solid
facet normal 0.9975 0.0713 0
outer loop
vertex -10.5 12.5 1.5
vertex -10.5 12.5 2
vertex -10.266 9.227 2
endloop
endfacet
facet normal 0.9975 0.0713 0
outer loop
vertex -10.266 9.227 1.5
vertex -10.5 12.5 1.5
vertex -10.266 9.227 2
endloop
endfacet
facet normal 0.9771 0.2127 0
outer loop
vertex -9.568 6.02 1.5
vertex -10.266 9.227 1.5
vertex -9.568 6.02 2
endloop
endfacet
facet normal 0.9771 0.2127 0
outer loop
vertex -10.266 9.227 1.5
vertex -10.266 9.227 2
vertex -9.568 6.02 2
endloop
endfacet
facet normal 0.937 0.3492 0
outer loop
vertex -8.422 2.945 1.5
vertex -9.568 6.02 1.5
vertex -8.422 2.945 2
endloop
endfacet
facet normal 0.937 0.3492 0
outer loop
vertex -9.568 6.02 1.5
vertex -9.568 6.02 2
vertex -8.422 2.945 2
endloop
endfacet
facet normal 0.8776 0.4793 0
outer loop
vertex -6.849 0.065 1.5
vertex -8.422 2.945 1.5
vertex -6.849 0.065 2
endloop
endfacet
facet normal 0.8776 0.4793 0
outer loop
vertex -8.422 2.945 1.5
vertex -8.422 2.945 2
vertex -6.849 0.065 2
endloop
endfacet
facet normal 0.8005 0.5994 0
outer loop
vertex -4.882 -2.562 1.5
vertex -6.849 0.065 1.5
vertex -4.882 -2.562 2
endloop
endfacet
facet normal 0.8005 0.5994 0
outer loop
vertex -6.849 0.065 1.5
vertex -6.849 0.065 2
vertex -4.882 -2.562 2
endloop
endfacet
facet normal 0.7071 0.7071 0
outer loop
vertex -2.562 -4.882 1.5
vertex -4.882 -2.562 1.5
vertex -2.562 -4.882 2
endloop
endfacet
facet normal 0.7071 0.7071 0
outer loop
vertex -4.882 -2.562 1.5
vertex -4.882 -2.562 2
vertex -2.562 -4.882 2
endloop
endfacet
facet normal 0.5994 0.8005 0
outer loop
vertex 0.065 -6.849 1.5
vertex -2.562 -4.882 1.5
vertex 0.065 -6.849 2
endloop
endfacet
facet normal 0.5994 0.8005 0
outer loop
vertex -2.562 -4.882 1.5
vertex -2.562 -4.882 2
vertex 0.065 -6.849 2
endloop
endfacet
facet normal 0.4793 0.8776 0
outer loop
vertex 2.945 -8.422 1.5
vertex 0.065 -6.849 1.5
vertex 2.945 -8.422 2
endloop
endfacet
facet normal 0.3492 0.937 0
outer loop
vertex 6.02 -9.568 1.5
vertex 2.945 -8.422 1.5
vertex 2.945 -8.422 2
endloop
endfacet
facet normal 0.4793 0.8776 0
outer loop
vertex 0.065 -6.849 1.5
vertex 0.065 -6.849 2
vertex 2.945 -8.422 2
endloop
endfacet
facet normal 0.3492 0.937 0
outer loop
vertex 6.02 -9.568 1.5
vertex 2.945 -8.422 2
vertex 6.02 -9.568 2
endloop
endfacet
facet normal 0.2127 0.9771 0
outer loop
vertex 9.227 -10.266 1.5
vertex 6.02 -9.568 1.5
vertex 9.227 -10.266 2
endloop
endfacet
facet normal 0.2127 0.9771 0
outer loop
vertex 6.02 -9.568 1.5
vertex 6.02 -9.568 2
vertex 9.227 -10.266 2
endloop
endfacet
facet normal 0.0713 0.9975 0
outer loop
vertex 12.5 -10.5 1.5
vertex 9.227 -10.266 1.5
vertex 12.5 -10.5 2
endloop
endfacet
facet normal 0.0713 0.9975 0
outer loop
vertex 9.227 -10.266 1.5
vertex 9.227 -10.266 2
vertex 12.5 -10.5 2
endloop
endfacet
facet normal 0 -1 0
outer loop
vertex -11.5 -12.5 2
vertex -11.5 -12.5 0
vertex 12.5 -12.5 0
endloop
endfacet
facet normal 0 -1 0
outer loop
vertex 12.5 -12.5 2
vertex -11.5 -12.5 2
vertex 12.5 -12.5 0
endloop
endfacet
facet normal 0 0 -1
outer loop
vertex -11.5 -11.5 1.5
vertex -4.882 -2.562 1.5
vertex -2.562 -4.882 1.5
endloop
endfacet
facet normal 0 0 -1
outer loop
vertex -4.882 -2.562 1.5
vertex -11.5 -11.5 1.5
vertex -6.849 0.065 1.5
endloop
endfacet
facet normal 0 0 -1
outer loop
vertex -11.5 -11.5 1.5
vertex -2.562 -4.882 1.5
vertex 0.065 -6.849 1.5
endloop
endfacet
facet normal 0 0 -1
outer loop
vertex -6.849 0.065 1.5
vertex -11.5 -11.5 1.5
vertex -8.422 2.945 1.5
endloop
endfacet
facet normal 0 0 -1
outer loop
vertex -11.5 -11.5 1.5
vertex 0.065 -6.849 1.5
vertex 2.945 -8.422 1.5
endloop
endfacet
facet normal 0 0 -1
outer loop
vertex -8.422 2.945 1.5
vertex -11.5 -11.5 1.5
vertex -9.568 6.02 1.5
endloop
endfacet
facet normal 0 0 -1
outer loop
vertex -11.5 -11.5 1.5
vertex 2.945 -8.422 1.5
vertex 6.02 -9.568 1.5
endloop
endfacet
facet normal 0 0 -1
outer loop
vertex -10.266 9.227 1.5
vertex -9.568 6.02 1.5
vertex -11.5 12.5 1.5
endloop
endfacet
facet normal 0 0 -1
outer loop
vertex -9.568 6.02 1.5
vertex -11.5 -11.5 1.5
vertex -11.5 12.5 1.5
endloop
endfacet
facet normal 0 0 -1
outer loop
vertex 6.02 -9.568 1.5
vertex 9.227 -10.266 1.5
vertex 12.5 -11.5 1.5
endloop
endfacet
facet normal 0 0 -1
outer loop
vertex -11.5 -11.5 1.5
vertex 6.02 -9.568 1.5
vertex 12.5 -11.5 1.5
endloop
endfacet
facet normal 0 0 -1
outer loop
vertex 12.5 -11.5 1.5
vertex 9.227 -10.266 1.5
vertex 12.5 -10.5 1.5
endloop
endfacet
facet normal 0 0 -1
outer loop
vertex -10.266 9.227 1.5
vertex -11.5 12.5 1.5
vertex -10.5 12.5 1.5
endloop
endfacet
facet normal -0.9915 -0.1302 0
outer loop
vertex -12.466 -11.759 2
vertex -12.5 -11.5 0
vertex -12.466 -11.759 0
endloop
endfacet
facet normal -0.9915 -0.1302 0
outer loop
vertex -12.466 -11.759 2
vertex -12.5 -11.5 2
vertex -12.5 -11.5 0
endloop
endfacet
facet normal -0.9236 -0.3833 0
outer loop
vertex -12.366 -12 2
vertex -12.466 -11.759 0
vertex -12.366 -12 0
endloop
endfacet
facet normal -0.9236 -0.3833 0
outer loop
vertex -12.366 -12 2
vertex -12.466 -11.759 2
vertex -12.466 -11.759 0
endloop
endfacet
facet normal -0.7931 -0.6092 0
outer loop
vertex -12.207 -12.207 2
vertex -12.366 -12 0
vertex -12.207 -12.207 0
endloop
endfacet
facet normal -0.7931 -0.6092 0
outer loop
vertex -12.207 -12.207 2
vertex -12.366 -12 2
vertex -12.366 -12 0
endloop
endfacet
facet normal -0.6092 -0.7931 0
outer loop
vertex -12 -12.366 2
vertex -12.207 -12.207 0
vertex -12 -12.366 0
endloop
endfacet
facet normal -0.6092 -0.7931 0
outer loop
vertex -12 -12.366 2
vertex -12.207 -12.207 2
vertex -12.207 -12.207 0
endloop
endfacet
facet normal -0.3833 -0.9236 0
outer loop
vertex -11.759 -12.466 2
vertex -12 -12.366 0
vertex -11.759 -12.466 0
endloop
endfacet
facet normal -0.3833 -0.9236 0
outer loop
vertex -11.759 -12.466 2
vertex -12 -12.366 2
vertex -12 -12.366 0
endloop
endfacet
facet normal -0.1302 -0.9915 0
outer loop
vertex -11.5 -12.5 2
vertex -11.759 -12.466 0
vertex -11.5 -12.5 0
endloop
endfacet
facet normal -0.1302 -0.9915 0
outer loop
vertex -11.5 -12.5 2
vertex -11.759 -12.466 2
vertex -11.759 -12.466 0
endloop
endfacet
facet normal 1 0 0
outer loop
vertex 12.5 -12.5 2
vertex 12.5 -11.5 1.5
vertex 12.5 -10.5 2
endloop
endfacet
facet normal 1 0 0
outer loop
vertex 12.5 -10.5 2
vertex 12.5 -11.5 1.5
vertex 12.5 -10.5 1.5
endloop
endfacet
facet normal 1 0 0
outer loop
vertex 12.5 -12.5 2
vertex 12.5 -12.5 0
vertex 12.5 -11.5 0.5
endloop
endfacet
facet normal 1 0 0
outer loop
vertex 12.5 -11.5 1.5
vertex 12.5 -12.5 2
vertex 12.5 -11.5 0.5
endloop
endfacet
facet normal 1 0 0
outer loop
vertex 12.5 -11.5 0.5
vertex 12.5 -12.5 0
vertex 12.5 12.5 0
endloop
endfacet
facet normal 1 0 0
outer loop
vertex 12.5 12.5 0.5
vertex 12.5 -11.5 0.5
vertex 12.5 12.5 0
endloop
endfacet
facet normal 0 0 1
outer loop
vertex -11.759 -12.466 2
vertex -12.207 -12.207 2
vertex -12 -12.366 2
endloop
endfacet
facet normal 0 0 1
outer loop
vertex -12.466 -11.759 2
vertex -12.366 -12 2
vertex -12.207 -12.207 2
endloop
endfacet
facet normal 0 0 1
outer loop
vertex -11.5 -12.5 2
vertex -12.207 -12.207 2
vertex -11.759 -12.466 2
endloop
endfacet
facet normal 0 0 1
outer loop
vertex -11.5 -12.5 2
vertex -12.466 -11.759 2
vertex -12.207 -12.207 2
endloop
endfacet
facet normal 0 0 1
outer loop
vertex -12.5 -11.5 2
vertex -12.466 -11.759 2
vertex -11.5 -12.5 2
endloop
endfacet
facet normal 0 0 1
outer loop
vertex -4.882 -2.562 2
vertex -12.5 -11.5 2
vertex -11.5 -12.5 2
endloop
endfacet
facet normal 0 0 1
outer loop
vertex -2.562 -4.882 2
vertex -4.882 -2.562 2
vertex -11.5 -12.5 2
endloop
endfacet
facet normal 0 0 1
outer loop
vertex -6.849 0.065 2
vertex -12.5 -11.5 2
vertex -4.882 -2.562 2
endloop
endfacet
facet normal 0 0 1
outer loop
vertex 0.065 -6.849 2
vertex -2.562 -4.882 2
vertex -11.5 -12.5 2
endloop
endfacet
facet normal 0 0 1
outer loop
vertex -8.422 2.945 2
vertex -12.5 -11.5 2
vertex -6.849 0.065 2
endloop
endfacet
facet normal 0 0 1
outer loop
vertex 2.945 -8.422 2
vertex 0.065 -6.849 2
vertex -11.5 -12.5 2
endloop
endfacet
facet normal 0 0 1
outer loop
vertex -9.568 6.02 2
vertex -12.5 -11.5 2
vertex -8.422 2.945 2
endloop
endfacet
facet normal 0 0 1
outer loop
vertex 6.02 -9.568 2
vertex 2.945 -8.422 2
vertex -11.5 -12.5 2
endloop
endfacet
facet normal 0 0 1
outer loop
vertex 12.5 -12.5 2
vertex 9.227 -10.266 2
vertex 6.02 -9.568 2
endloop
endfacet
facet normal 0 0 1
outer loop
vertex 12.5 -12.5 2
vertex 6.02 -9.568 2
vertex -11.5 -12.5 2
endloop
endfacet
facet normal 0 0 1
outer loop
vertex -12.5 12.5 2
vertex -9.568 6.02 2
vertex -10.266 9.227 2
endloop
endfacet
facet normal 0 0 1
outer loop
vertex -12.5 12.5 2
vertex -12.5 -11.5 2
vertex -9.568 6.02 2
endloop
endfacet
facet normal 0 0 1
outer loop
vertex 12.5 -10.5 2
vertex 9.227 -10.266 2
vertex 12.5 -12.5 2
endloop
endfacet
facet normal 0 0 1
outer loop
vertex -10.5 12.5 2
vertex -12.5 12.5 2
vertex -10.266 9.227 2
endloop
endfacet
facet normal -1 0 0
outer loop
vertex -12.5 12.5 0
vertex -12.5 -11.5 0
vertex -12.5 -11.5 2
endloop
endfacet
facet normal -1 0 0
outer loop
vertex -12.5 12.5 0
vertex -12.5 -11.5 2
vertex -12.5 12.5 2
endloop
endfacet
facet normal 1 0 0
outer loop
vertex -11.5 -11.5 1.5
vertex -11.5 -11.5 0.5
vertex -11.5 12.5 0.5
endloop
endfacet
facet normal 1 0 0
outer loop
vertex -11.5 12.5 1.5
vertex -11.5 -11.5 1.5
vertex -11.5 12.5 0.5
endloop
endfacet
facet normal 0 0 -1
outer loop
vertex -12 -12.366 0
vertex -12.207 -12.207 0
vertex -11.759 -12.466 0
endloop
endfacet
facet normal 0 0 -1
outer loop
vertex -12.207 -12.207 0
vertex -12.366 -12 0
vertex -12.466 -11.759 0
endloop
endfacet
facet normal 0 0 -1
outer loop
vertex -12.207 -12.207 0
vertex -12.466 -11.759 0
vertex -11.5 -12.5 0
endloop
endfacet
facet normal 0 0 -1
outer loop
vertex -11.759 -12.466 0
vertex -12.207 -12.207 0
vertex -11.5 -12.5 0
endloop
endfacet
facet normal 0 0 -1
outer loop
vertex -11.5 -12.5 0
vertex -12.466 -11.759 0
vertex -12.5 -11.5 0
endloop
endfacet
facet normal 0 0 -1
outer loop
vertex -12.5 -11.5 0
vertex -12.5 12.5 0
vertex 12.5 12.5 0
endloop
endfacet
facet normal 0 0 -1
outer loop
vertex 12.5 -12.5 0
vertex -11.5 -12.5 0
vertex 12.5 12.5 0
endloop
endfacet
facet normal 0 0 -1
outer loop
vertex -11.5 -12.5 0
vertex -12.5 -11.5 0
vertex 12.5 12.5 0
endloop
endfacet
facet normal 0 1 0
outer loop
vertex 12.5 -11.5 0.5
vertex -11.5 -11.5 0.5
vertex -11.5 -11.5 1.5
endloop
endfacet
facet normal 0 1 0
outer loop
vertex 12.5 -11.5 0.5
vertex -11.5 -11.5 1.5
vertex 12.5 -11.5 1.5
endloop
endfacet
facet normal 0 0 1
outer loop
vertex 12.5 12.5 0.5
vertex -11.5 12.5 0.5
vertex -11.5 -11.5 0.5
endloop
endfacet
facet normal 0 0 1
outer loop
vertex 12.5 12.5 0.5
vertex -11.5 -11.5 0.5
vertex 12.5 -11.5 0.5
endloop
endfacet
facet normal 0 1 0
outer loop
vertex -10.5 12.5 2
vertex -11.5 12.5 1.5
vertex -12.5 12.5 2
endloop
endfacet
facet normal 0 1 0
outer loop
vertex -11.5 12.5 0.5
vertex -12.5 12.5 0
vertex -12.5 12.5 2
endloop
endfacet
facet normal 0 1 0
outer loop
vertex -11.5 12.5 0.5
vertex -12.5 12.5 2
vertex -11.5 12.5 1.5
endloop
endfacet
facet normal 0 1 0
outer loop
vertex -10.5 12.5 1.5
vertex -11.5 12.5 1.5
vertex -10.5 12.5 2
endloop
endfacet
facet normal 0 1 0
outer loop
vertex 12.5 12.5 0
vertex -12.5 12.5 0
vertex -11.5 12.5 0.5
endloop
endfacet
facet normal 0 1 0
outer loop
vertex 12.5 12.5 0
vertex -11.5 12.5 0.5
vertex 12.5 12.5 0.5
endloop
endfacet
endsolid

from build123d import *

# Parameters (mm, degrees)
F0_W     = 25
F0_H     = 25
F1_DEPTH = 2
F3_DEPTH = 1.5
F4_W     = 27.374725
F4_H     = 28.161746
F5_DEPTH = 1
F6_R     = 1


with BuildPart() as f1:
    # F0 (on Top) → F1 (new body)
    with BuildSketch(Plane.XY):
        Rectangle(F0_W, F0_H)
    extrude(amount=F1_DEPTH)

    # F2 (on face) → F3 (cut)
    with BuildSketch(Plane.XY.offset(2)):
        with BuildLine():
            Line((12.5, -10.5), (12.5, 12.5))
            Line((12.5, 12.5), (-10.5, 12.5))
            ThreePointArc((-10.5, 12.5), (-3.763456, -3.763456), (12.5, -10.5))
        make_face()
    extrude(amount=-F3_DEPTH, mode=Mode.SUBTRACT)

    # F4 (on face) → F5 (cut)
    with BuildSketch(Plane.XY.offset(0.5)):
        with Locations((2.187362, 2.580873)):
            Rectangle(F4_W, F4_H)
    extrude(amount=F5_DEPTH, mode=Mode.SUBTRACT)

    # F6
    f6_edges = [f1.edges().sort_by_distance(p)[0] for p in [
        (-12.5, -12.5, 1),
    ]]
    fillet(f6_edges, radius=F6_R)


solid = f1.part
